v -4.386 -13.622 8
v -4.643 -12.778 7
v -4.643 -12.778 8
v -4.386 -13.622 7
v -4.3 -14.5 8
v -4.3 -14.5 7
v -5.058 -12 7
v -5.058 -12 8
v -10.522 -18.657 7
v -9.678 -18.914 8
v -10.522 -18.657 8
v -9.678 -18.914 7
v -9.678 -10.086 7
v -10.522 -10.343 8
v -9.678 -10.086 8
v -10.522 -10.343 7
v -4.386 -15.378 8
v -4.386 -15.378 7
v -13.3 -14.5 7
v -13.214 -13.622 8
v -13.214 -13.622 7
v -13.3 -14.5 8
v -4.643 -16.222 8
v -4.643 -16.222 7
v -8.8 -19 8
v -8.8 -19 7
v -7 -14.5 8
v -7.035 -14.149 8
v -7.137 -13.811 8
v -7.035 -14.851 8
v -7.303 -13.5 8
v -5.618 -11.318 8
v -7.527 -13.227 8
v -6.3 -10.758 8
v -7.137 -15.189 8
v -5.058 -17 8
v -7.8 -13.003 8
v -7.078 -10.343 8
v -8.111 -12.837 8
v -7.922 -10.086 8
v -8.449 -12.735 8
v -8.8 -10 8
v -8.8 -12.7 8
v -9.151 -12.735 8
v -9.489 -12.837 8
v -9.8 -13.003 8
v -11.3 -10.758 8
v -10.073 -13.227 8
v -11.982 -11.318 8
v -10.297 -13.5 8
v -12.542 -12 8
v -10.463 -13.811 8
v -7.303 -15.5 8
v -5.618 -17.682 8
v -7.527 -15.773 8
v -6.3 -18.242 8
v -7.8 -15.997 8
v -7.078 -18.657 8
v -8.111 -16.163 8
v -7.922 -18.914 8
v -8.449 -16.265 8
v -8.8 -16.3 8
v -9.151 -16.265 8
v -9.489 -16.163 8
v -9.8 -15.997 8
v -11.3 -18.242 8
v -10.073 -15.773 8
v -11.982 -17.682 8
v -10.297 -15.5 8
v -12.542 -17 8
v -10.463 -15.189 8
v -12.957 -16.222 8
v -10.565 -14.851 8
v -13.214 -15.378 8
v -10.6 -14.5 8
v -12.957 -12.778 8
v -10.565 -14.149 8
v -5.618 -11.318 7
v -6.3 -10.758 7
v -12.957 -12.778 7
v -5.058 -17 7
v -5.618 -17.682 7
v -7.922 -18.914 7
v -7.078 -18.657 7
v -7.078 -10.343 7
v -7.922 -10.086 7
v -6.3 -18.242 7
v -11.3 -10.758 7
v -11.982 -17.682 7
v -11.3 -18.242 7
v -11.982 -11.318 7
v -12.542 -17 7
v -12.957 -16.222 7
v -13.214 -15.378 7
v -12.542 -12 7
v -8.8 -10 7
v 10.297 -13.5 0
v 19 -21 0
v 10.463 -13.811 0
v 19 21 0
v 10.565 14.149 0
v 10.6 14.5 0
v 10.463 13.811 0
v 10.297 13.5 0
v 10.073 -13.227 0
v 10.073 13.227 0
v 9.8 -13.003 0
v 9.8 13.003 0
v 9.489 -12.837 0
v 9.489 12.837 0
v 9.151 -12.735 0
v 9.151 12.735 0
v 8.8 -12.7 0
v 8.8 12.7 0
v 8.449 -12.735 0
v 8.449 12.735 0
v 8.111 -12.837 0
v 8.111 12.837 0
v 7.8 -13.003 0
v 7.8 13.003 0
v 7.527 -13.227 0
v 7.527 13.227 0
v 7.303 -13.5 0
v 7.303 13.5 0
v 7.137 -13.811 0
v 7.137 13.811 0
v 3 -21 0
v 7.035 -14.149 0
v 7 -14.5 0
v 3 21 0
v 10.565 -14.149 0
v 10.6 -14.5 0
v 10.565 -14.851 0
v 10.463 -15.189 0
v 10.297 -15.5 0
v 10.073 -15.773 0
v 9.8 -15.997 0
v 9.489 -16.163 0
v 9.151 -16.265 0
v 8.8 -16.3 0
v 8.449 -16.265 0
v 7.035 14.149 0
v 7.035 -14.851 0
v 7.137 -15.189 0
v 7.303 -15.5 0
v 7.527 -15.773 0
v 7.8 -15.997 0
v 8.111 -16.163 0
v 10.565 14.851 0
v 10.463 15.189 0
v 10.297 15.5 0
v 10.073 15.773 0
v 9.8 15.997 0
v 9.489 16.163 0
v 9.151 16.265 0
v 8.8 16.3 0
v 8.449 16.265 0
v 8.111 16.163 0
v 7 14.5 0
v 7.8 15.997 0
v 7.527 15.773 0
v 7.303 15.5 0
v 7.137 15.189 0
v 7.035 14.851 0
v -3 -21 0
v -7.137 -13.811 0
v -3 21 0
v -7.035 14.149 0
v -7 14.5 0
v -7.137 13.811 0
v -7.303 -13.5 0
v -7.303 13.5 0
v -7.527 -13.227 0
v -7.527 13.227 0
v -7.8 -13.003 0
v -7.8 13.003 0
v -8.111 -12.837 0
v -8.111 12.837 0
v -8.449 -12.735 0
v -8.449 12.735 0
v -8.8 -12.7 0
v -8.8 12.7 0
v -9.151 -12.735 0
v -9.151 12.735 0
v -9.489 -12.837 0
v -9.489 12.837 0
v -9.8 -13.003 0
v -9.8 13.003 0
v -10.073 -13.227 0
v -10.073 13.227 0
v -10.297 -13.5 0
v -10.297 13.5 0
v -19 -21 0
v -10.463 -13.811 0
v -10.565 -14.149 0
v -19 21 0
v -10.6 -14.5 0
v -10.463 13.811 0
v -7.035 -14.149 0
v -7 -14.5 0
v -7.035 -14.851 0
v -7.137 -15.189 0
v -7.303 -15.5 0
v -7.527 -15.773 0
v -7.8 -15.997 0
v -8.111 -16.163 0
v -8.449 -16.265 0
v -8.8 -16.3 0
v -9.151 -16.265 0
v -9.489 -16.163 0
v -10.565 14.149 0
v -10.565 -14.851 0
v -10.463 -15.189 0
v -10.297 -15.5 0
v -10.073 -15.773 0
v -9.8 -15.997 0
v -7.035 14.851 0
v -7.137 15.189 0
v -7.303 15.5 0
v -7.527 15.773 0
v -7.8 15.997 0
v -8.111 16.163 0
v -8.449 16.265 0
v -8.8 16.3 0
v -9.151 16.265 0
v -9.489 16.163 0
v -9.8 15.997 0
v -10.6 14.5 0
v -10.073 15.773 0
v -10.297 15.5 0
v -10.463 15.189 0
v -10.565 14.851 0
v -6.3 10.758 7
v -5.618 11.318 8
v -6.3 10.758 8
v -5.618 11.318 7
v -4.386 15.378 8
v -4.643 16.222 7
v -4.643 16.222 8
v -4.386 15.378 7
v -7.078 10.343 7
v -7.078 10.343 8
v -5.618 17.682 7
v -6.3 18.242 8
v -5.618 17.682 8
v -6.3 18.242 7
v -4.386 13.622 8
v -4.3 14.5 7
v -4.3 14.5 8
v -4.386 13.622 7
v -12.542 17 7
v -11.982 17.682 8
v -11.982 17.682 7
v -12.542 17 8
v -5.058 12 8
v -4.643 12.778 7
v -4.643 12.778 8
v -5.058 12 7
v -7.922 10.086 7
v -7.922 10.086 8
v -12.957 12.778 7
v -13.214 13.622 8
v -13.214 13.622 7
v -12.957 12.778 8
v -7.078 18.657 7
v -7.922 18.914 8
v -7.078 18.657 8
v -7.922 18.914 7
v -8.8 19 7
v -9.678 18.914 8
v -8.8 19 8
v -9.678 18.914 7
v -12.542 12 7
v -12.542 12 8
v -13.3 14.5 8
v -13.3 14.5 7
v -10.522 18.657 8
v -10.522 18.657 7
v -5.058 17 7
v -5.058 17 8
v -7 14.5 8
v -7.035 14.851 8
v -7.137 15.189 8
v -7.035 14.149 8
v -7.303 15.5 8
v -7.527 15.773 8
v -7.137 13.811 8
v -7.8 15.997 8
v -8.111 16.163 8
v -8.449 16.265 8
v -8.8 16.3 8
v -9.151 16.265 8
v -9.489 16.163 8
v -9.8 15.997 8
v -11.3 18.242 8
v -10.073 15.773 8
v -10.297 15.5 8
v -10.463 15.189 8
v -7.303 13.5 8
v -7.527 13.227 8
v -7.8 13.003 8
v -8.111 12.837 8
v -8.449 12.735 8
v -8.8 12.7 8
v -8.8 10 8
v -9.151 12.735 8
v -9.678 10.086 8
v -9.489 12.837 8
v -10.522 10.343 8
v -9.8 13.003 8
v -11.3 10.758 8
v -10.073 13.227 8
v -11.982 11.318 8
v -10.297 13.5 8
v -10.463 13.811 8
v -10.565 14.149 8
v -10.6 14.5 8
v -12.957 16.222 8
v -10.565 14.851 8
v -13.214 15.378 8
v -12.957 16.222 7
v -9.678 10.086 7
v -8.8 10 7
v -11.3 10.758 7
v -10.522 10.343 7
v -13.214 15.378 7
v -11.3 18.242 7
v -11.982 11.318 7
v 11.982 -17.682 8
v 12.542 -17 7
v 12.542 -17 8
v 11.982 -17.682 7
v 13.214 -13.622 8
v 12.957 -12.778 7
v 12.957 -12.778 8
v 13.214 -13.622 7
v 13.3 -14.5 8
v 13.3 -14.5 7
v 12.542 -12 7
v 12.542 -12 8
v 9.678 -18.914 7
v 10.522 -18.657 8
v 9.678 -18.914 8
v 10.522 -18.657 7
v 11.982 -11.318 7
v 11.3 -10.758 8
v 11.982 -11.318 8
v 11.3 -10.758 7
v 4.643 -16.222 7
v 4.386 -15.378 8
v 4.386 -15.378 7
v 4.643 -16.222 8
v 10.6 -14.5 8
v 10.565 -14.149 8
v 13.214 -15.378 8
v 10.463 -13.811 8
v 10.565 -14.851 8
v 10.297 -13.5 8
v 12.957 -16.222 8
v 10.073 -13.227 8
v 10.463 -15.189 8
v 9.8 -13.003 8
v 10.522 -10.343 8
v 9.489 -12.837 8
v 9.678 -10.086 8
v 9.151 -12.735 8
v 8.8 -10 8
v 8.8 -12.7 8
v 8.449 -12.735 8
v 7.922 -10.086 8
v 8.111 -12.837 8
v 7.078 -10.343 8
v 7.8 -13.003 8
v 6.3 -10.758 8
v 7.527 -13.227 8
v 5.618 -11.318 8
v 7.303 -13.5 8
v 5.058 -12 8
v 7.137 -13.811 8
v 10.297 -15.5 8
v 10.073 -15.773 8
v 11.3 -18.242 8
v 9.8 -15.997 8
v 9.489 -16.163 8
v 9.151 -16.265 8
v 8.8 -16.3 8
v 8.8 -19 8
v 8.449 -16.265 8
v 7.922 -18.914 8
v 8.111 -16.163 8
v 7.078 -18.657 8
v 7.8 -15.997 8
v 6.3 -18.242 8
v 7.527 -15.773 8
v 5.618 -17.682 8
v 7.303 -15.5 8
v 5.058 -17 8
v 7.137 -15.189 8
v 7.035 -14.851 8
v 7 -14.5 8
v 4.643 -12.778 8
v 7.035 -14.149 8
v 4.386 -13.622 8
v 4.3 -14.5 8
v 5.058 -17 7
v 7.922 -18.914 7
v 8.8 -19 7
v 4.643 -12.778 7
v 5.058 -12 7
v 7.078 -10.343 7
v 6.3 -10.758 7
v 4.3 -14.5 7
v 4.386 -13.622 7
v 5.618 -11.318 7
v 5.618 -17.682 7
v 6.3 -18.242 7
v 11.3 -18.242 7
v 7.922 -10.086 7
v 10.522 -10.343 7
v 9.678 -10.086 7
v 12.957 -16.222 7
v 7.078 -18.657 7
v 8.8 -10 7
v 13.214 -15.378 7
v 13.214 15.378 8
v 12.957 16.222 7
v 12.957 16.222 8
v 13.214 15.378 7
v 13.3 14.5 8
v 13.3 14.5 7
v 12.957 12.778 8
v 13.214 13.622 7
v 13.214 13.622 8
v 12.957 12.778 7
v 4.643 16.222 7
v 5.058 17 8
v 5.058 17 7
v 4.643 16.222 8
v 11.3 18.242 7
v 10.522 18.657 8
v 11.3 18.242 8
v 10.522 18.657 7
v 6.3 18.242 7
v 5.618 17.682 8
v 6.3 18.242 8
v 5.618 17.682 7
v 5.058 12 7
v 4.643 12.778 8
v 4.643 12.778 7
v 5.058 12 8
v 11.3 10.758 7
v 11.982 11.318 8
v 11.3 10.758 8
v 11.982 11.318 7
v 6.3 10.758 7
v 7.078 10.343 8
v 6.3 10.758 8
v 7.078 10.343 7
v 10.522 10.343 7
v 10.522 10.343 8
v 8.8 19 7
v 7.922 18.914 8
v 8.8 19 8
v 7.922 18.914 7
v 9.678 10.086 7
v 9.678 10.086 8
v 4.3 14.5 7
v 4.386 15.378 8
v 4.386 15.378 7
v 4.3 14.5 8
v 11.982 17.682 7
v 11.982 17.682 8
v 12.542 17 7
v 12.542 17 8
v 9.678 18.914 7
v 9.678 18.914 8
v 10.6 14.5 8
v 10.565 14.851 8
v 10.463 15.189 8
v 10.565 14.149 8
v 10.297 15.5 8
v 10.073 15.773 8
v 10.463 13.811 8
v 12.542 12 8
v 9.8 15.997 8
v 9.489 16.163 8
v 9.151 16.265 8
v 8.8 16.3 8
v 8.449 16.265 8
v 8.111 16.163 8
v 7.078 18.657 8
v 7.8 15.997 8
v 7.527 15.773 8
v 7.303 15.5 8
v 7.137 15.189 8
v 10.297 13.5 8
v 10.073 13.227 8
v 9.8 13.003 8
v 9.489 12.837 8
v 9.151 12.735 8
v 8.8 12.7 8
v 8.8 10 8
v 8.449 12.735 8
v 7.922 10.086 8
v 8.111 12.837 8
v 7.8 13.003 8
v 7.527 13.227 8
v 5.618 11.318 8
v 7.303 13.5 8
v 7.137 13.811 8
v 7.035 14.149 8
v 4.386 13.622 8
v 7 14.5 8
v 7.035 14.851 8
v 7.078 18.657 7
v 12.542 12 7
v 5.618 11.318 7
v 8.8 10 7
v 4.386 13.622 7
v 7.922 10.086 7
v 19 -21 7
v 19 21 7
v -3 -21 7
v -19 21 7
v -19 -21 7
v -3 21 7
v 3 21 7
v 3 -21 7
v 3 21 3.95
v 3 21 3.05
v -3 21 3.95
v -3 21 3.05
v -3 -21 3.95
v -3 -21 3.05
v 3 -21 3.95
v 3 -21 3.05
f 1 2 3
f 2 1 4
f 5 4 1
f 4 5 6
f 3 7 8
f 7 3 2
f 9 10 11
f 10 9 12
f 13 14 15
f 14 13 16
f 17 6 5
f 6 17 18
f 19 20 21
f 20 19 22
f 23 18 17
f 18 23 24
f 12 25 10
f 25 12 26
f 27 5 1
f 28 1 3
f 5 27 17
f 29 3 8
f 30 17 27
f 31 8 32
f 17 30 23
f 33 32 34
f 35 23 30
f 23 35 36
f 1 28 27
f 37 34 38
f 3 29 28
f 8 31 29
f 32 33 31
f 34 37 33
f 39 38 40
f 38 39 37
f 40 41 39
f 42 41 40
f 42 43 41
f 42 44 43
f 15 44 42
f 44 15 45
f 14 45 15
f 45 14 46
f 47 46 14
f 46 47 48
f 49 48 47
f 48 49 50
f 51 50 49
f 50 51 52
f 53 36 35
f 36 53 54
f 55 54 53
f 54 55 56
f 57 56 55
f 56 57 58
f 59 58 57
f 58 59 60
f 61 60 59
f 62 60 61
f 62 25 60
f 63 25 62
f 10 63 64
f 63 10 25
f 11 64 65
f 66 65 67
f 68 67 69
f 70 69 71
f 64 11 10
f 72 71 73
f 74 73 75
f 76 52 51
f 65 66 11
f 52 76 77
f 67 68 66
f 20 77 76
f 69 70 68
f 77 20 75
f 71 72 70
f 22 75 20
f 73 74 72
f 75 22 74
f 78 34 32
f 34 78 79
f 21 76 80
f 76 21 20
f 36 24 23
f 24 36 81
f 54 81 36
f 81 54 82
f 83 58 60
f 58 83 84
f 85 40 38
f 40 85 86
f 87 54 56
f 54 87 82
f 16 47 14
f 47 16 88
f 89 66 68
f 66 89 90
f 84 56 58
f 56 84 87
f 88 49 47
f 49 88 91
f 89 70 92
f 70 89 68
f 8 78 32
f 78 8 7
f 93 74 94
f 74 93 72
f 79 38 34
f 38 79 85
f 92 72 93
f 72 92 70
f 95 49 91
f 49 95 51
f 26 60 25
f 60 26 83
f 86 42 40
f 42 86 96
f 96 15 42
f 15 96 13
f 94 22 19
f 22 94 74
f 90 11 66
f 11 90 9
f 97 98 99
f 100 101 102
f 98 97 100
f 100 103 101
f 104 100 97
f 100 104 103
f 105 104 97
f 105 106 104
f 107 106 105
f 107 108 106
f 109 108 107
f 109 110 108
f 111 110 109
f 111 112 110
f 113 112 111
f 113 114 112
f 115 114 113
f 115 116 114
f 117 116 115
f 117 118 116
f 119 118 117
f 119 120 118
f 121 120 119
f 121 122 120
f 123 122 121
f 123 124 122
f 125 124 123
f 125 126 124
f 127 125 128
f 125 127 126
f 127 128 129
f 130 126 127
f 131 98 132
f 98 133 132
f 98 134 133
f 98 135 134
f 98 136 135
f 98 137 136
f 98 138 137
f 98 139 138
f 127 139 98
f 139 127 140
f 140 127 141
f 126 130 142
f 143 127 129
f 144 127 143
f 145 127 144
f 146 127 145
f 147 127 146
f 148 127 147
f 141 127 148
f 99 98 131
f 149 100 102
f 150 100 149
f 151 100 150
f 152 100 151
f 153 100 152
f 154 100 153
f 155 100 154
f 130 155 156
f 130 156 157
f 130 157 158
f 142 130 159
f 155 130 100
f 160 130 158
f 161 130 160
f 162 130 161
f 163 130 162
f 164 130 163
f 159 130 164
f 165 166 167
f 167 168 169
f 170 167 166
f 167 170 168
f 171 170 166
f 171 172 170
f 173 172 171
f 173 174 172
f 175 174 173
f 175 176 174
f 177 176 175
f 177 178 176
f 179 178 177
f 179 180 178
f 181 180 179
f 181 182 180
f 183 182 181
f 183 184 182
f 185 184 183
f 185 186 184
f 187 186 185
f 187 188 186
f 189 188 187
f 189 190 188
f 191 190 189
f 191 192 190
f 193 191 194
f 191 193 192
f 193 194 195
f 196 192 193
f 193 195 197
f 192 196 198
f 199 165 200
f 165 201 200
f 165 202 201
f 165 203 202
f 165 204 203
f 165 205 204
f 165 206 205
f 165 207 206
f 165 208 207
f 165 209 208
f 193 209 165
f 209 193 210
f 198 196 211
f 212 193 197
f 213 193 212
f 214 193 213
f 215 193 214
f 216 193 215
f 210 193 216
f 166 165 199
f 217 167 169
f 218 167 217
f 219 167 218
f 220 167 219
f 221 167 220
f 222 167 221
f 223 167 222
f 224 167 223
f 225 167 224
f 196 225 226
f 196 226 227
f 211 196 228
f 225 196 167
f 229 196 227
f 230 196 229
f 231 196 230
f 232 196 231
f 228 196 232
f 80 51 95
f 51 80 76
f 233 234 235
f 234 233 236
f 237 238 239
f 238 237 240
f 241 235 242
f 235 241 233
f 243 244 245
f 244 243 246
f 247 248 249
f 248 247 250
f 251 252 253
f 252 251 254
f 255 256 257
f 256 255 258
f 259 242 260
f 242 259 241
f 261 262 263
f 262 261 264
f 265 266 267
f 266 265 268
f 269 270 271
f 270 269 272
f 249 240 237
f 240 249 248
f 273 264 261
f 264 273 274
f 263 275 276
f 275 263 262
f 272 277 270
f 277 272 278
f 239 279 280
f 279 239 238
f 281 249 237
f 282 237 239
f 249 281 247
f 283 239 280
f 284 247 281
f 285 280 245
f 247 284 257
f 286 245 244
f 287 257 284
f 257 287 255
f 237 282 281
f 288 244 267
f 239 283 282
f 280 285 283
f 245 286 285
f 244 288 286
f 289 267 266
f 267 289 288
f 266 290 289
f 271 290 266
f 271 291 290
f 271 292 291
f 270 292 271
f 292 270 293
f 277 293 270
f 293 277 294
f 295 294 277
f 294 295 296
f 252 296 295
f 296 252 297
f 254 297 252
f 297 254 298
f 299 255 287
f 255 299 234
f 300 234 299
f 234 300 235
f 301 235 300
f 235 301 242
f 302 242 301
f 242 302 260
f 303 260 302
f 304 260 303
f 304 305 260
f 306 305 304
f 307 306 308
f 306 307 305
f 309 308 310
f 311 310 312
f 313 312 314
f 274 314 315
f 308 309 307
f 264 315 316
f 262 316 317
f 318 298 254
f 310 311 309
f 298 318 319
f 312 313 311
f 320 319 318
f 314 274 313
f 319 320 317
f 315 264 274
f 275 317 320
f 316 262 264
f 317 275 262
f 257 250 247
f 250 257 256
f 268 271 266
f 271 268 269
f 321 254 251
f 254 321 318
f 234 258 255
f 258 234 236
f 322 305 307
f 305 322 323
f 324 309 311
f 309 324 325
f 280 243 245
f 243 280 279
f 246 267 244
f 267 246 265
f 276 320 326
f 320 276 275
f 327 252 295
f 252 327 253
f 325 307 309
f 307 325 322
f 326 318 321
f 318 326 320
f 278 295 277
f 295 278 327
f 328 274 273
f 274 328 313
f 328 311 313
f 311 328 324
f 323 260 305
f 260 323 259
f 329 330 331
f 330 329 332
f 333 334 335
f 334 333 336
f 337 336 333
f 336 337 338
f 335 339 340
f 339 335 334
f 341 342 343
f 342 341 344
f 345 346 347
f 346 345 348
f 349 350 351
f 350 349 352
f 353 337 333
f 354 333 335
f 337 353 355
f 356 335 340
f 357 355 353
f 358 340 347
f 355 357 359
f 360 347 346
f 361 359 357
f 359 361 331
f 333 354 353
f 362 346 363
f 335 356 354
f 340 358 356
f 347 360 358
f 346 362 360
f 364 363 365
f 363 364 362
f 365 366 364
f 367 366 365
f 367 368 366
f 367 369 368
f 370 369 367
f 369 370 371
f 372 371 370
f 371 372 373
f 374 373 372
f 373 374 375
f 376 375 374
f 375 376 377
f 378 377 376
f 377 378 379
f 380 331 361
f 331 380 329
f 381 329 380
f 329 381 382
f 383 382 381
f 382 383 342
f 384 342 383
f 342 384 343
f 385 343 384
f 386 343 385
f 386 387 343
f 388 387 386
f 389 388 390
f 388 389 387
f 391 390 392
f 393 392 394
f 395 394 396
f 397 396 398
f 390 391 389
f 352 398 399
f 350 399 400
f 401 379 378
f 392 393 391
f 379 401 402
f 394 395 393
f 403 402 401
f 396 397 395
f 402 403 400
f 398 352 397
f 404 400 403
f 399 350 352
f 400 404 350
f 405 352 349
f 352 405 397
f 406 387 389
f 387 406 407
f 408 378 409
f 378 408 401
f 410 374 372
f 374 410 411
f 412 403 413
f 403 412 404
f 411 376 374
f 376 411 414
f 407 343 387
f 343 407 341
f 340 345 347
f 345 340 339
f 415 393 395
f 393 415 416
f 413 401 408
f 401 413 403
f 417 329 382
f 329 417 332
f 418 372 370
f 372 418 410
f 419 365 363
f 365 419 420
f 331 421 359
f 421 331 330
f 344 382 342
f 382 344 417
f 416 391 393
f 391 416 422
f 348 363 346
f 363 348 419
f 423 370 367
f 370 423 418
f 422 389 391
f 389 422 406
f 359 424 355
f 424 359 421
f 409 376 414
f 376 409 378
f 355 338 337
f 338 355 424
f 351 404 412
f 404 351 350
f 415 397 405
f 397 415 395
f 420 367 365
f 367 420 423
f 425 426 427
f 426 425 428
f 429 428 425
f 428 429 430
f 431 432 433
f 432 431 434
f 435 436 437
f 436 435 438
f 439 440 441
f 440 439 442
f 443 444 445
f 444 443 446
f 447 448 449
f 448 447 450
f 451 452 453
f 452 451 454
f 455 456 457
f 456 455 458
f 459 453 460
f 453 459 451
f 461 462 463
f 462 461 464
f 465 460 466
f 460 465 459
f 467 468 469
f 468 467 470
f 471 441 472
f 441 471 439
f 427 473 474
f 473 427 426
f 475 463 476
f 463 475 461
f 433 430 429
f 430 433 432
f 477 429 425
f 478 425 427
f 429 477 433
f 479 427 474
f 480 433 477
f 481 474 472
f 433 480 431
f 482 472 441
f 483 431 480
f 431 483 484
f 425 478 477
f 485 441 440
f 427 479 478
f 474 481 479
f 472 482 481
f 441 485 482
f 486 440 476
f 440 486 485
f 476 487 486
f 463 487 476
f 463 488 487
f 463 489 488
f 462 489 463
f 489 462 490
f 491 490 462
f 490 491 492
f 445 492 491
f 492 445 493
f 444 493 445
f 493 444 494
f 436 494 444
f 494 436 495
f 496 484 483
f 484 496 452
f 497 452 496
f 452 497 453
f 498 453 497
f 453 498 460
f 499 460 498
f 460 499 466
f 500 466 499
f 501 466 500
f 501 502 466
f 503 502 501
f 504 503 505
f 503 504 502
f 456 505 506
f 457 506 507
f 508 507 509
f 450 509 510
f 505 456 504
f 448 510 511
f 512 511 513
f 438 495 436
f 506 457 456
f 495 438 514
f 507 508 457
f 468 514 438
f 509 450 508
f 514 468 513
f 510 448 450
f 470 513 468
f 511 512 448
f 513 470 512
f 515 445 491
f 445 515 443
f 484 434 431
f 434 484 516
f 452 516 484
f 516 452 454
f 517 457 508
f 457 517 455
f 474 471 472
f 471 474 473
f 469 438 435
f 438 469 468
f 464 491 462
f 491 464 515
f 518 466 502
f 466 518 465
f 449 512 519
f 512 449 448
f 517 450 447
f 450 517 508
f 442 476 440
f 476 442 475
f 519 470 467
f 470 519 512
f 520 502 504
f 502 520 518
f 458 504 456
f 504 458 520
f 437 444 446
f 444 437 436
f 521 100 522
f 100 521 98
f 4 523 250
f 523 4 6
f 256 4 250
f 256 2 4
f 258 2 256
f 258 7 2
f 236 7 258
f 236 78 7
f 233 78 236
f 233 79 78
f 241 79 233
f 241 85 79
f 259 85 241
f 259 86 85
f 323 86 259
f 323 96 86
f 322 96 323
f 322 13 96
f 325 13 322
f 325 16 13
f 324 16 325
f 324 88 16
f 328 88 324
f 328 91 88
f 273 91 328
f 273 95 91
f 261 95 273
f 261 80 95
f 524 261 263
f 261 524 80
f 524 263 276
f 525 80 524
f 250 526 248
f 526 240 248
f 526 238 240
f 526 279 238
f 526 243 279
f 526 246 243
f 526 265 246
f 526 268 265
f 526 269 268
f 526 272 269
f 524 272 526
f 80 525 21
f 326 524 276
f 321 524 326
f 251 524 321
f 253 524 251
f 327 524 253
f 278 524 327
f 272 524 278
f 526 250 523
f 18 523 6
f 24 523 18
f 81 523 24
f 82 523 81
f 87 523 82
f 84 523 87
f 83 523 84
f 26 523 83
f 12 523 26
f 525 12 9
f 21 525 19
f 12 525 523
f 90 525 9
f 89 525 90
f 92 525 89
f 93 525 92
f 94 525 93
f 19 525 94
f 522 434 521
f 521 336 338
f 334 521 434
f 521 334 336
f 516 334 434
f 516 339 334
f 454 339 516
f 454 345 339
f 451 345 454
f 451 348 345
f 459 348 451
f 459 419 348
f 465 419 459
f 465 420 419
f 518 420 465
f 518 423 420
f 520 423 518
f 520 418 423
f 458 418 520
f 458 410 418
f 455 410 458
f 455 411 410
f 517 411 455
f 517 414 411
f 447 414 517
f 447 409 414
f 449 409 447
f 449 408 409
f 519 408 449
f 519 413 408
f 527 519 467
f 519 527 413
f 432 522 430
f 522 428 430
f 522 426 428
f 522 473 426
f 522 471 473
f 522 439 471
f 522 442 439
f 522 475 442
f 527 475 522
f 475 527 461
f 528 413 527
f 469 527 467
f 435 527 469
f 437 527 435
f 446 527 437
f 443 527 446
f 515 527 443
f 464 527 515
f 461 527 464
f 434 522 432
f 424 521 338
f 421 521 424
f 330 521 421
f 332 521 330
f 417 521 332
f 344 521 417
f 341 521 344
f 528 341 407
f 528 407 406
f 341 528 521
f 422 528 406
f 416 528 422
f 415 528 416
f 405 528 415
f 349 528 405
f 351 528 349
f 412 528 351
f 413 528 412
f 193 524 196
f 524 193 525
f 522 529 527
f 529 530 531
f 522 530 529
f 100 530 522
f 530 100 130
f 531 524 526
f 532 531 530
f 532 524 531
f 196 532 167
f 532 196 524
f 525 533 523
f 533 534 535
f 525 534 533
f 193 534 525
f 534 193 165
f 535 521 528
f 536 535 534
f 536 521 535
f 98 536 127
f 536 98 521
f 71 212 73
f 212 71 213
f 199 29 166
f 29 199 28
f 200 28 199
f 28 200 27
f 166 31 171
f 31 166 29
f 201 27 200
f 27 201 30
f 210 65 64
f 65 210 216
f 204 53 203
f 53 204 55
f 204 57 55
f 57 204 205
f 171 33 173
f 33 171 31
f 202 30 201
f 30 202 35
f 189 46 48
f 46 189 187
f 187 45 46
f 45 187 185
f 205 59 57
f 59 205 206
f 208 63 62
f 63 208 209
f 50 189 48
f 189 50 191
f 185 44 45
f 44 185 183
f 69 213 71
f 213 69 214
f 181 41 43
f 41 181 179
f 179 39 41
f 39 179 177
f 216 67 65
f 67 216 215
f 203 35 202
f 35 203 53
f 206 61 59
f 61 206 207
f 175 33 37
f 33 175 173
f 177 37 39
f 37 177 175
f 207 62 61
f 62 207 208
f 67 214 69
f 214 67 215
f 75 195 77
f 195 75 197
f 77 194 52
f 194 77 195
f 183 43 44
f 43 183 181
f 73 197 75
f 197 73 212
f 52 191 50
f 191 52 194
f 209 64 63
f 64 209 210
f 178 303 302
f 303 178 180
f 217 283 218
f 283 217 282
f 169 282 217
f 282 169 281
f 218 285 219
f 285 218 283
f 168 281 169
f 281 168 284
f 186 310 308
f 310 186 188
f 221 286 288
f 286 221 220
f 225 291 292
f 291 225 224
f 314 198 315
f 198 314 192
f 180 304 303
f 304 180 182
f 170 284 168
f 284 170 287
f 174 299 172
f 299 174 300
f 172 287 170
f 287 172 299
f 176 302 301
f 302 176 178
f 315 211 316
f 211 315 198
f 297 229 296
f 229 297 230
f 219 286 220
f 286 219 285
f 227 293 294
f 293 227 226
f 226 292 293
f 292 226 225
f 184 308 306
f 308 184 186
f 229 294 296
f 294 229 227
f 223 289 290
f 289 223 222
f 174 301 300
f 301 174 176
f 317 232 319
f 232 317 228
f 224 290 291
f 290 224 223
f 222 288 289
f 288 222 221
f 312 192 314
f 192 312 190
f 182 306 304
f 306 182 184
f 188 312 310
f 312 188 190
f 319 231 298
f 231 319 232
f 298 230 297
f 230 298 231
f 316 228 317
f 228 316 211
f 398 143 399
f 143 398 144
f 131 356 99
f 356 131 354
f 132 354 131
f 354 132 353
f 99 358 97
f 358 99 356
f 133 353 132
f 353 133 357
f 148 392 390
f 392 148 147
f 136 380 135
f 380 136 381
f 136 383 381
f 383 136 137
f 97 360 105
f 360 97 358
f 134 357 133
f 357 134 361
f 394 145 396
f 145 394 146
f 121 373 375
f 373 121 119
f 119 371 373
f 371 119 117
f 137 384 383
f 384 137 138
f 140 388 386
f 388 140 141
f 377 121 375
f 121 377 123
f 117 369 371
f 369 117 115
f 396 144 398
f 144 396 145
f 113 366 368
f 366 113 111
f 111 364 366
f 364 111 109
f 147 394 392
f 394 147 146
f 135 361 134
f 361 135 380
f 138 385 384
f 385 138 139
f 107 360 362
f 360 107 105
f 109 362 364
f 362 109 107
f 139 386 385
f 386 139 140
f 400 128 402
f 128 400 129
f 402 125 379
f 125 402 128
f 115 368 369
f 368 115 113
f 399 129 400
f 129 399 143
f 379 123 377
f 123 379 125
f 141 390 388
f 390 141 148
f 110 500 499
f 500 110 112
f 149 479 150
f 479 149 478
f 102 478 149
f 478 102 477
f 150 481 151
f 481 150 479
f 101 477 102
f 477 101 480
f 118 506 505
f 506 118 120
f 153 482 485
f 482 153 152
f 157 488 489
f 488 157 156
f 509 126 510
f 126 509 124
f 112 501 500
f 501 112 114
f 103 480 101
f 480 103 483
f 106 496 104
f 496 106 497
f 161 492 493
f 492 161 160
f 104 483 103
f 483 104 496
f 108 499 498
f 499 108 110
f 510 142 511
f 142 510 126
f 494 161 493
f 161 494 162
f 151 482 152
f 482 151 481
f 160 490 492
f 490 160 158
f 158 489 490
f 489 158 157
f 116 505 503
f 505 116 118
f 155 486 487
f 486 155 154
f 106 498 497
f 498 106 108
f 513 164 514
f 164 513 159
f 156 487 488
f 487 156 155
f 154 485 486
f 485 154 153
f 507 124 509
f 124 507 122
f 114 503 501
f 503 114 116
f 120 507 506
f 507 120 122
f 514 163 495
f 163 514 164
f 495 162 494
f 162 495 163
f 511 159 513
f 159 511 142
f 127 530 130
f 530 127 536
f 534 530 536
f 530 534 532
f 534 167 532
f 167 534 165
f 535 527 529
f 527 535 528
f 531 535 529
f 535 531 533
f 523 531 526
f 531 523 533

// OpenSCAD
$fn = 32;

// ----------------------------------------------------------------------
// Living hinge: 38 x 42 mm plates, 0.9 mm flexible web
// ----------------------------------------------------------------------

// --- parameters (mm) ---
plate_len = 16;           // plate length outside the web
plate_w = 42;             // plate width
thick = 7;                // plate thickness
web_half = 3;             // half width of the flex band
web_t = 0.9;              // flexible web thickness
web_z = 3.05;             // web position inside the thickness
boss_d = 9;               // screw boss diameter
boss_h = 8;               // screw boss height
boss_x = 8.8;             // screw boss distance from the web
screw_d = 3.6;            // screw hole

difference() {
  union() {
    /* one flat strip, later thinned at the middle */
    translate([-19, -21, 0]) cube([38, 42, 7]);
    /* screw bosses, sunk 0.5 mm into the plates */
    for (sx = [-8.8, 8.8]) {
      for (sy = [-14.5, 14.5]) {
        translate([sx, sy, 0]) cylinder(h = boss_h, d = boss_d);
      }
    }
  }
  /* channel from below: leaves the web on top of it */
  translate([-3, -23.5, -2.5]) cube([6, 47, 5.55]);
  /* channel from above: thins the web down to web_t */
  translate([-3, -23.5, 3.95]) cube([6, 47, 5.55]);
  /* screw holes through the bosses */
  for (sx = [-8.8, 8.8]) {
    for (sy = [-14.5, 14.5]) {
      translate([sx, sy, -2.5]) cylinder(h = boss_h + 5, d = screw_d);
    }
  }
}
